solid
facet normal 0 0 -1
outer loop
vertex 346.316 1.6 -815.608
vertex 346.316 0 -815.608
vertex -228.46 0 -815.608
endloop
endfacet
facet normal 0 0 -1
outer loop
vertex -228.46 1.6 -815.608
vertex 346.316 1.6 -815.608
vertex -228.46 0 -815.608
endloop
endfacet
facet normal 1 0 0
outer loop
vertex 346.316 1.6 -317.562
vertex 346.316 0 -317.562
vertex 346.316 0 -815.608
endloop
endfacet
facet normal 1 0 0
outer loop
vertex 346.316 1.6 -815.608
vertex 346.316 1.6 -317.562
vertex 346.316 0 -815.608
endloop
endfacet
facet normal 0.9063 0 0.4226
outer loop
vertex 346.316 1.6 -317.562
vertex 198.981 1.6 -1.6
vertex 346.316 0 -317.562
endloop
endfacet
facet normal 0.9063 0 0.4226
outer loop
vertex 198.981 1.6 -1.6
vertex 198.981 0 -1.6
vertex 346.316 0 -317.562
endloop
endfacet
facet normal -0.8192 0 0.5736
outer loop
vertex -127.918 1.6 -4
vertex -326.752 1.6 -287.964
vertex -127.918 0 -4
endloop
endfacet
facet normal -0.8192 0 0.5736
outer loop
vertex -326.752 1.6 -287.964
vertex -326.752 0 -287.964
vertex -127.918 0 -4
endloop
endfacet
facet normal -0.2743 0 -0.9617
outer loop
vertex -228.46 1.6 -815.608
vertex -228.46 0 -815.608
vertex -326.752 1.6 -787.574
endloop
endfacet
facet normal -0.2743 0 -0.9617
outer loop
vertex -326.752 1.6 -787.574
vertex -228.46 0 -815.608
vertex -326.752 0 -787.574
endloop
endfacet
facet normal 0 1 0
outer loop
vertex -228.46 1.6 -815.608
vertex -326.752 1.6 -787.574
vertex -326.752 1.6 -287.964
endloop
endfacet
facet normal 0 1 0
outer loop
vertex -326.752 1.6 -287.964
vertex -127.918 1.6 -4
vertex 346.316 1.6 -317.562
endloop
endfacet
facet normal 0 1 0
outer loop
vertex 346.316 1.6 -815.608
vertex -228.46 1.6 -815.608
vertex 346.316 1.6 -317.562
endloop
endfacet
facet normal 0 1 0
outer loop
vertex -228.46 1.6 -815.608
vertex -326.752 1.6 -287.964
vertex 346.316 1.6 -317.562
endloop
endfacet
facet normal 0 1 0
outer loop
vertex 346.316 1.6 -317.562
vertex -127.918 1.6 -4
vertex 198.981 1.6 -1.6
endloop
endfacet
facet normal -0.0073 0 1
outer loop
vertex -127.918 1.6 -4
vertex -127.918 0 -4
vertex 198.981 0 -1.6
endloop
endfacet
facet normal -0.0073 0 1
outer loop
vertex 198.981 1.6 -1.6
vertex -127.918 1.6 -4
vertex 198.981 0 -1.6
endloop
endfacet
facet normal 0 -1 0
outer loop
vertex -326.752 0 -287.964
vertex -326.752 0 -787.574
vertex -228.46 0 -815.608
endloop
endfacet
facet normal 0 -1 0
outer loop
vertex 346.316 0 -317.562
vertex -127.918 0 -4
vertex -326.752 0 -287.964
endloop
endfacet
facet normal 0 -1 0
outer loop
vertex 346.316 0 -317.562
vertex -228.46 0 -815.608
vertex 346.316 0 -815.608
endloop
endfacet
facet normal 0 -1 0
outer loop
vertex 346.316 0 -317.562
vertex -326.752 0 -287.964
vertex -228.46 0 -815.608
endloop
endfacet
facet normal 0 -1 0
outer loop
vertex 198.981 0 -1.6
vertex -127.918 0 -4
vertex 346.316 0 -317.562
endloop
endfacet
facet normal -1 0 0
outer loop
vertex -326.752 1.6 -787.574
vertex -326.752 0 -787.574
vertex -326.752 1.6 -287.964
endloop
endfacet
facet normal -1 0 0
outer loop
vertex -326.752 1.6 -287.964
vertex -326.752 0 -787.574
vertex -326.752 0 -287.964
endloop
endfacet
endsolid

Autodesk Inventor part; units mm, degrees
ref_plane "YZ Plane" through (0, 0, 0) normal (1, 0, 0) x (0, 1, 0)
ref_plane "XZ Plane" through (0, 0, 0) normal (0, 1, 0) x (-1, 0, 0)
ref_plane "XY Plane" through (0, 0, 0) normal (0, 0, 1) x (1, 0, 0)
ref_plane "Work Plane1" through (-244.5168, 0, -292.1078) normal (0, -1, 0) x (1, 0, 0)
sketch "Sketch1" plane through (-244.5168, 0, -292.1078) normal (0, -1, 0) x (1, 0, 0)
  line L0 (-82.2349, -443.0164) -> (-82.2349, 4.1434)
  line L1 (16.0565, -523.4999) -> (-89.6349, -493.4083) projected
  line L2 (-82.2349, 4.1434) -> (116.5991, 288.1078)
  line L3 (116.5991, 288.1078) -> (240.5168, 288.1078)
  line L4 (590.8332, -25.4546) -> (443.4975, 290.5078) projected
  line L5 (590.8332, -523.4999) -> (590.8332, -25.4546) projected
  point P0 (244.5168, 292.1078)
sketch "Sketch2" plane through (-244.5168, 0, -292.1078) normal (0, -1, 0) x (1, 0, 0)
  line L0 (16.0565, -523.4999) -> (-82.2349, -495.4665)
  line L1 (-82.2349, -495.4665) -> (-82.2349, 4.1434)
  line L2 (-82.2349, 4.1434) -> (116.5991, 288.1078)
  line L3 (116.5991, 288.1078) -> (443.4975, 290.5078)
  line L4 (443.4975, 290.5078) -> (590.8332, -25.4546)
  line L5 (590.8332, -25.4546) -> (590.8332, -523.4999)
  line L6 (590.8332, -523.4999) -> (16.0565, -523.4999)
  point P0 (244.5168, 292.1078)
extrude "Plate extrude" add sketch "Sketch2" against normal blind 1.6
sketch "Sketch3" plane through (-244.5168, 0, -292.1078) normal (0, -1, 0) x (1, 0, 0)
  circle A0 centre (303.4237, -47.9675) radius 80.5 construction
  circle A1 centre (303.4237, -47.7578) radius 75 construction
  line L0 (153.4237, 102.2422) -> (453.4237, 102.2422)
  line L1 (453.4237, 102.2422) -> (453.4237, -197.7578)
  line L2 (453.4237, -197.7578) -> (153.4237, -197.7578)
  line L3 (153.4237, -197.7578) -> (153.4237, 102.2422)
  line L4 (153.4237, 102.2422) -> (453.4237, -197.7578) construction
  line L5 (453.4237, 102.2422) -> (153.4237, -197.7578) construction
  point P0 (244.5168, 292.1078)
  dimension "d3" = 300
  dimension "d4" = 300
extrude "Tailstock door" [suppressed]
sketch "Sketch4" plane through (-244.5168, 0, -292.1078) normal (0, -1, 0) x (1, 0, 0)
  circle A0 centre (303.4237, -47.7578) radius 75 construction
  circle A1 centre (303.4237, -47.7578) radius 81.28
  circle A2 centre (303.4237, -47.9675) radius 80.5 construction
  point P0 (244.5168, 292.1078)
  dimension "d7" = 162.56
  dimension "d8" = 161
extrude "Headstock cut out" [suppressed]
sketch "Sketch5" plane through (-244.5168, 1.6, -292.1078) normal (0, 1, 0) x (1, 0, 0)
  point P0 (244.5168, -292.1078)
  point P1 (303.4237, 47.9675)
properties part number "side cover plate Base"
